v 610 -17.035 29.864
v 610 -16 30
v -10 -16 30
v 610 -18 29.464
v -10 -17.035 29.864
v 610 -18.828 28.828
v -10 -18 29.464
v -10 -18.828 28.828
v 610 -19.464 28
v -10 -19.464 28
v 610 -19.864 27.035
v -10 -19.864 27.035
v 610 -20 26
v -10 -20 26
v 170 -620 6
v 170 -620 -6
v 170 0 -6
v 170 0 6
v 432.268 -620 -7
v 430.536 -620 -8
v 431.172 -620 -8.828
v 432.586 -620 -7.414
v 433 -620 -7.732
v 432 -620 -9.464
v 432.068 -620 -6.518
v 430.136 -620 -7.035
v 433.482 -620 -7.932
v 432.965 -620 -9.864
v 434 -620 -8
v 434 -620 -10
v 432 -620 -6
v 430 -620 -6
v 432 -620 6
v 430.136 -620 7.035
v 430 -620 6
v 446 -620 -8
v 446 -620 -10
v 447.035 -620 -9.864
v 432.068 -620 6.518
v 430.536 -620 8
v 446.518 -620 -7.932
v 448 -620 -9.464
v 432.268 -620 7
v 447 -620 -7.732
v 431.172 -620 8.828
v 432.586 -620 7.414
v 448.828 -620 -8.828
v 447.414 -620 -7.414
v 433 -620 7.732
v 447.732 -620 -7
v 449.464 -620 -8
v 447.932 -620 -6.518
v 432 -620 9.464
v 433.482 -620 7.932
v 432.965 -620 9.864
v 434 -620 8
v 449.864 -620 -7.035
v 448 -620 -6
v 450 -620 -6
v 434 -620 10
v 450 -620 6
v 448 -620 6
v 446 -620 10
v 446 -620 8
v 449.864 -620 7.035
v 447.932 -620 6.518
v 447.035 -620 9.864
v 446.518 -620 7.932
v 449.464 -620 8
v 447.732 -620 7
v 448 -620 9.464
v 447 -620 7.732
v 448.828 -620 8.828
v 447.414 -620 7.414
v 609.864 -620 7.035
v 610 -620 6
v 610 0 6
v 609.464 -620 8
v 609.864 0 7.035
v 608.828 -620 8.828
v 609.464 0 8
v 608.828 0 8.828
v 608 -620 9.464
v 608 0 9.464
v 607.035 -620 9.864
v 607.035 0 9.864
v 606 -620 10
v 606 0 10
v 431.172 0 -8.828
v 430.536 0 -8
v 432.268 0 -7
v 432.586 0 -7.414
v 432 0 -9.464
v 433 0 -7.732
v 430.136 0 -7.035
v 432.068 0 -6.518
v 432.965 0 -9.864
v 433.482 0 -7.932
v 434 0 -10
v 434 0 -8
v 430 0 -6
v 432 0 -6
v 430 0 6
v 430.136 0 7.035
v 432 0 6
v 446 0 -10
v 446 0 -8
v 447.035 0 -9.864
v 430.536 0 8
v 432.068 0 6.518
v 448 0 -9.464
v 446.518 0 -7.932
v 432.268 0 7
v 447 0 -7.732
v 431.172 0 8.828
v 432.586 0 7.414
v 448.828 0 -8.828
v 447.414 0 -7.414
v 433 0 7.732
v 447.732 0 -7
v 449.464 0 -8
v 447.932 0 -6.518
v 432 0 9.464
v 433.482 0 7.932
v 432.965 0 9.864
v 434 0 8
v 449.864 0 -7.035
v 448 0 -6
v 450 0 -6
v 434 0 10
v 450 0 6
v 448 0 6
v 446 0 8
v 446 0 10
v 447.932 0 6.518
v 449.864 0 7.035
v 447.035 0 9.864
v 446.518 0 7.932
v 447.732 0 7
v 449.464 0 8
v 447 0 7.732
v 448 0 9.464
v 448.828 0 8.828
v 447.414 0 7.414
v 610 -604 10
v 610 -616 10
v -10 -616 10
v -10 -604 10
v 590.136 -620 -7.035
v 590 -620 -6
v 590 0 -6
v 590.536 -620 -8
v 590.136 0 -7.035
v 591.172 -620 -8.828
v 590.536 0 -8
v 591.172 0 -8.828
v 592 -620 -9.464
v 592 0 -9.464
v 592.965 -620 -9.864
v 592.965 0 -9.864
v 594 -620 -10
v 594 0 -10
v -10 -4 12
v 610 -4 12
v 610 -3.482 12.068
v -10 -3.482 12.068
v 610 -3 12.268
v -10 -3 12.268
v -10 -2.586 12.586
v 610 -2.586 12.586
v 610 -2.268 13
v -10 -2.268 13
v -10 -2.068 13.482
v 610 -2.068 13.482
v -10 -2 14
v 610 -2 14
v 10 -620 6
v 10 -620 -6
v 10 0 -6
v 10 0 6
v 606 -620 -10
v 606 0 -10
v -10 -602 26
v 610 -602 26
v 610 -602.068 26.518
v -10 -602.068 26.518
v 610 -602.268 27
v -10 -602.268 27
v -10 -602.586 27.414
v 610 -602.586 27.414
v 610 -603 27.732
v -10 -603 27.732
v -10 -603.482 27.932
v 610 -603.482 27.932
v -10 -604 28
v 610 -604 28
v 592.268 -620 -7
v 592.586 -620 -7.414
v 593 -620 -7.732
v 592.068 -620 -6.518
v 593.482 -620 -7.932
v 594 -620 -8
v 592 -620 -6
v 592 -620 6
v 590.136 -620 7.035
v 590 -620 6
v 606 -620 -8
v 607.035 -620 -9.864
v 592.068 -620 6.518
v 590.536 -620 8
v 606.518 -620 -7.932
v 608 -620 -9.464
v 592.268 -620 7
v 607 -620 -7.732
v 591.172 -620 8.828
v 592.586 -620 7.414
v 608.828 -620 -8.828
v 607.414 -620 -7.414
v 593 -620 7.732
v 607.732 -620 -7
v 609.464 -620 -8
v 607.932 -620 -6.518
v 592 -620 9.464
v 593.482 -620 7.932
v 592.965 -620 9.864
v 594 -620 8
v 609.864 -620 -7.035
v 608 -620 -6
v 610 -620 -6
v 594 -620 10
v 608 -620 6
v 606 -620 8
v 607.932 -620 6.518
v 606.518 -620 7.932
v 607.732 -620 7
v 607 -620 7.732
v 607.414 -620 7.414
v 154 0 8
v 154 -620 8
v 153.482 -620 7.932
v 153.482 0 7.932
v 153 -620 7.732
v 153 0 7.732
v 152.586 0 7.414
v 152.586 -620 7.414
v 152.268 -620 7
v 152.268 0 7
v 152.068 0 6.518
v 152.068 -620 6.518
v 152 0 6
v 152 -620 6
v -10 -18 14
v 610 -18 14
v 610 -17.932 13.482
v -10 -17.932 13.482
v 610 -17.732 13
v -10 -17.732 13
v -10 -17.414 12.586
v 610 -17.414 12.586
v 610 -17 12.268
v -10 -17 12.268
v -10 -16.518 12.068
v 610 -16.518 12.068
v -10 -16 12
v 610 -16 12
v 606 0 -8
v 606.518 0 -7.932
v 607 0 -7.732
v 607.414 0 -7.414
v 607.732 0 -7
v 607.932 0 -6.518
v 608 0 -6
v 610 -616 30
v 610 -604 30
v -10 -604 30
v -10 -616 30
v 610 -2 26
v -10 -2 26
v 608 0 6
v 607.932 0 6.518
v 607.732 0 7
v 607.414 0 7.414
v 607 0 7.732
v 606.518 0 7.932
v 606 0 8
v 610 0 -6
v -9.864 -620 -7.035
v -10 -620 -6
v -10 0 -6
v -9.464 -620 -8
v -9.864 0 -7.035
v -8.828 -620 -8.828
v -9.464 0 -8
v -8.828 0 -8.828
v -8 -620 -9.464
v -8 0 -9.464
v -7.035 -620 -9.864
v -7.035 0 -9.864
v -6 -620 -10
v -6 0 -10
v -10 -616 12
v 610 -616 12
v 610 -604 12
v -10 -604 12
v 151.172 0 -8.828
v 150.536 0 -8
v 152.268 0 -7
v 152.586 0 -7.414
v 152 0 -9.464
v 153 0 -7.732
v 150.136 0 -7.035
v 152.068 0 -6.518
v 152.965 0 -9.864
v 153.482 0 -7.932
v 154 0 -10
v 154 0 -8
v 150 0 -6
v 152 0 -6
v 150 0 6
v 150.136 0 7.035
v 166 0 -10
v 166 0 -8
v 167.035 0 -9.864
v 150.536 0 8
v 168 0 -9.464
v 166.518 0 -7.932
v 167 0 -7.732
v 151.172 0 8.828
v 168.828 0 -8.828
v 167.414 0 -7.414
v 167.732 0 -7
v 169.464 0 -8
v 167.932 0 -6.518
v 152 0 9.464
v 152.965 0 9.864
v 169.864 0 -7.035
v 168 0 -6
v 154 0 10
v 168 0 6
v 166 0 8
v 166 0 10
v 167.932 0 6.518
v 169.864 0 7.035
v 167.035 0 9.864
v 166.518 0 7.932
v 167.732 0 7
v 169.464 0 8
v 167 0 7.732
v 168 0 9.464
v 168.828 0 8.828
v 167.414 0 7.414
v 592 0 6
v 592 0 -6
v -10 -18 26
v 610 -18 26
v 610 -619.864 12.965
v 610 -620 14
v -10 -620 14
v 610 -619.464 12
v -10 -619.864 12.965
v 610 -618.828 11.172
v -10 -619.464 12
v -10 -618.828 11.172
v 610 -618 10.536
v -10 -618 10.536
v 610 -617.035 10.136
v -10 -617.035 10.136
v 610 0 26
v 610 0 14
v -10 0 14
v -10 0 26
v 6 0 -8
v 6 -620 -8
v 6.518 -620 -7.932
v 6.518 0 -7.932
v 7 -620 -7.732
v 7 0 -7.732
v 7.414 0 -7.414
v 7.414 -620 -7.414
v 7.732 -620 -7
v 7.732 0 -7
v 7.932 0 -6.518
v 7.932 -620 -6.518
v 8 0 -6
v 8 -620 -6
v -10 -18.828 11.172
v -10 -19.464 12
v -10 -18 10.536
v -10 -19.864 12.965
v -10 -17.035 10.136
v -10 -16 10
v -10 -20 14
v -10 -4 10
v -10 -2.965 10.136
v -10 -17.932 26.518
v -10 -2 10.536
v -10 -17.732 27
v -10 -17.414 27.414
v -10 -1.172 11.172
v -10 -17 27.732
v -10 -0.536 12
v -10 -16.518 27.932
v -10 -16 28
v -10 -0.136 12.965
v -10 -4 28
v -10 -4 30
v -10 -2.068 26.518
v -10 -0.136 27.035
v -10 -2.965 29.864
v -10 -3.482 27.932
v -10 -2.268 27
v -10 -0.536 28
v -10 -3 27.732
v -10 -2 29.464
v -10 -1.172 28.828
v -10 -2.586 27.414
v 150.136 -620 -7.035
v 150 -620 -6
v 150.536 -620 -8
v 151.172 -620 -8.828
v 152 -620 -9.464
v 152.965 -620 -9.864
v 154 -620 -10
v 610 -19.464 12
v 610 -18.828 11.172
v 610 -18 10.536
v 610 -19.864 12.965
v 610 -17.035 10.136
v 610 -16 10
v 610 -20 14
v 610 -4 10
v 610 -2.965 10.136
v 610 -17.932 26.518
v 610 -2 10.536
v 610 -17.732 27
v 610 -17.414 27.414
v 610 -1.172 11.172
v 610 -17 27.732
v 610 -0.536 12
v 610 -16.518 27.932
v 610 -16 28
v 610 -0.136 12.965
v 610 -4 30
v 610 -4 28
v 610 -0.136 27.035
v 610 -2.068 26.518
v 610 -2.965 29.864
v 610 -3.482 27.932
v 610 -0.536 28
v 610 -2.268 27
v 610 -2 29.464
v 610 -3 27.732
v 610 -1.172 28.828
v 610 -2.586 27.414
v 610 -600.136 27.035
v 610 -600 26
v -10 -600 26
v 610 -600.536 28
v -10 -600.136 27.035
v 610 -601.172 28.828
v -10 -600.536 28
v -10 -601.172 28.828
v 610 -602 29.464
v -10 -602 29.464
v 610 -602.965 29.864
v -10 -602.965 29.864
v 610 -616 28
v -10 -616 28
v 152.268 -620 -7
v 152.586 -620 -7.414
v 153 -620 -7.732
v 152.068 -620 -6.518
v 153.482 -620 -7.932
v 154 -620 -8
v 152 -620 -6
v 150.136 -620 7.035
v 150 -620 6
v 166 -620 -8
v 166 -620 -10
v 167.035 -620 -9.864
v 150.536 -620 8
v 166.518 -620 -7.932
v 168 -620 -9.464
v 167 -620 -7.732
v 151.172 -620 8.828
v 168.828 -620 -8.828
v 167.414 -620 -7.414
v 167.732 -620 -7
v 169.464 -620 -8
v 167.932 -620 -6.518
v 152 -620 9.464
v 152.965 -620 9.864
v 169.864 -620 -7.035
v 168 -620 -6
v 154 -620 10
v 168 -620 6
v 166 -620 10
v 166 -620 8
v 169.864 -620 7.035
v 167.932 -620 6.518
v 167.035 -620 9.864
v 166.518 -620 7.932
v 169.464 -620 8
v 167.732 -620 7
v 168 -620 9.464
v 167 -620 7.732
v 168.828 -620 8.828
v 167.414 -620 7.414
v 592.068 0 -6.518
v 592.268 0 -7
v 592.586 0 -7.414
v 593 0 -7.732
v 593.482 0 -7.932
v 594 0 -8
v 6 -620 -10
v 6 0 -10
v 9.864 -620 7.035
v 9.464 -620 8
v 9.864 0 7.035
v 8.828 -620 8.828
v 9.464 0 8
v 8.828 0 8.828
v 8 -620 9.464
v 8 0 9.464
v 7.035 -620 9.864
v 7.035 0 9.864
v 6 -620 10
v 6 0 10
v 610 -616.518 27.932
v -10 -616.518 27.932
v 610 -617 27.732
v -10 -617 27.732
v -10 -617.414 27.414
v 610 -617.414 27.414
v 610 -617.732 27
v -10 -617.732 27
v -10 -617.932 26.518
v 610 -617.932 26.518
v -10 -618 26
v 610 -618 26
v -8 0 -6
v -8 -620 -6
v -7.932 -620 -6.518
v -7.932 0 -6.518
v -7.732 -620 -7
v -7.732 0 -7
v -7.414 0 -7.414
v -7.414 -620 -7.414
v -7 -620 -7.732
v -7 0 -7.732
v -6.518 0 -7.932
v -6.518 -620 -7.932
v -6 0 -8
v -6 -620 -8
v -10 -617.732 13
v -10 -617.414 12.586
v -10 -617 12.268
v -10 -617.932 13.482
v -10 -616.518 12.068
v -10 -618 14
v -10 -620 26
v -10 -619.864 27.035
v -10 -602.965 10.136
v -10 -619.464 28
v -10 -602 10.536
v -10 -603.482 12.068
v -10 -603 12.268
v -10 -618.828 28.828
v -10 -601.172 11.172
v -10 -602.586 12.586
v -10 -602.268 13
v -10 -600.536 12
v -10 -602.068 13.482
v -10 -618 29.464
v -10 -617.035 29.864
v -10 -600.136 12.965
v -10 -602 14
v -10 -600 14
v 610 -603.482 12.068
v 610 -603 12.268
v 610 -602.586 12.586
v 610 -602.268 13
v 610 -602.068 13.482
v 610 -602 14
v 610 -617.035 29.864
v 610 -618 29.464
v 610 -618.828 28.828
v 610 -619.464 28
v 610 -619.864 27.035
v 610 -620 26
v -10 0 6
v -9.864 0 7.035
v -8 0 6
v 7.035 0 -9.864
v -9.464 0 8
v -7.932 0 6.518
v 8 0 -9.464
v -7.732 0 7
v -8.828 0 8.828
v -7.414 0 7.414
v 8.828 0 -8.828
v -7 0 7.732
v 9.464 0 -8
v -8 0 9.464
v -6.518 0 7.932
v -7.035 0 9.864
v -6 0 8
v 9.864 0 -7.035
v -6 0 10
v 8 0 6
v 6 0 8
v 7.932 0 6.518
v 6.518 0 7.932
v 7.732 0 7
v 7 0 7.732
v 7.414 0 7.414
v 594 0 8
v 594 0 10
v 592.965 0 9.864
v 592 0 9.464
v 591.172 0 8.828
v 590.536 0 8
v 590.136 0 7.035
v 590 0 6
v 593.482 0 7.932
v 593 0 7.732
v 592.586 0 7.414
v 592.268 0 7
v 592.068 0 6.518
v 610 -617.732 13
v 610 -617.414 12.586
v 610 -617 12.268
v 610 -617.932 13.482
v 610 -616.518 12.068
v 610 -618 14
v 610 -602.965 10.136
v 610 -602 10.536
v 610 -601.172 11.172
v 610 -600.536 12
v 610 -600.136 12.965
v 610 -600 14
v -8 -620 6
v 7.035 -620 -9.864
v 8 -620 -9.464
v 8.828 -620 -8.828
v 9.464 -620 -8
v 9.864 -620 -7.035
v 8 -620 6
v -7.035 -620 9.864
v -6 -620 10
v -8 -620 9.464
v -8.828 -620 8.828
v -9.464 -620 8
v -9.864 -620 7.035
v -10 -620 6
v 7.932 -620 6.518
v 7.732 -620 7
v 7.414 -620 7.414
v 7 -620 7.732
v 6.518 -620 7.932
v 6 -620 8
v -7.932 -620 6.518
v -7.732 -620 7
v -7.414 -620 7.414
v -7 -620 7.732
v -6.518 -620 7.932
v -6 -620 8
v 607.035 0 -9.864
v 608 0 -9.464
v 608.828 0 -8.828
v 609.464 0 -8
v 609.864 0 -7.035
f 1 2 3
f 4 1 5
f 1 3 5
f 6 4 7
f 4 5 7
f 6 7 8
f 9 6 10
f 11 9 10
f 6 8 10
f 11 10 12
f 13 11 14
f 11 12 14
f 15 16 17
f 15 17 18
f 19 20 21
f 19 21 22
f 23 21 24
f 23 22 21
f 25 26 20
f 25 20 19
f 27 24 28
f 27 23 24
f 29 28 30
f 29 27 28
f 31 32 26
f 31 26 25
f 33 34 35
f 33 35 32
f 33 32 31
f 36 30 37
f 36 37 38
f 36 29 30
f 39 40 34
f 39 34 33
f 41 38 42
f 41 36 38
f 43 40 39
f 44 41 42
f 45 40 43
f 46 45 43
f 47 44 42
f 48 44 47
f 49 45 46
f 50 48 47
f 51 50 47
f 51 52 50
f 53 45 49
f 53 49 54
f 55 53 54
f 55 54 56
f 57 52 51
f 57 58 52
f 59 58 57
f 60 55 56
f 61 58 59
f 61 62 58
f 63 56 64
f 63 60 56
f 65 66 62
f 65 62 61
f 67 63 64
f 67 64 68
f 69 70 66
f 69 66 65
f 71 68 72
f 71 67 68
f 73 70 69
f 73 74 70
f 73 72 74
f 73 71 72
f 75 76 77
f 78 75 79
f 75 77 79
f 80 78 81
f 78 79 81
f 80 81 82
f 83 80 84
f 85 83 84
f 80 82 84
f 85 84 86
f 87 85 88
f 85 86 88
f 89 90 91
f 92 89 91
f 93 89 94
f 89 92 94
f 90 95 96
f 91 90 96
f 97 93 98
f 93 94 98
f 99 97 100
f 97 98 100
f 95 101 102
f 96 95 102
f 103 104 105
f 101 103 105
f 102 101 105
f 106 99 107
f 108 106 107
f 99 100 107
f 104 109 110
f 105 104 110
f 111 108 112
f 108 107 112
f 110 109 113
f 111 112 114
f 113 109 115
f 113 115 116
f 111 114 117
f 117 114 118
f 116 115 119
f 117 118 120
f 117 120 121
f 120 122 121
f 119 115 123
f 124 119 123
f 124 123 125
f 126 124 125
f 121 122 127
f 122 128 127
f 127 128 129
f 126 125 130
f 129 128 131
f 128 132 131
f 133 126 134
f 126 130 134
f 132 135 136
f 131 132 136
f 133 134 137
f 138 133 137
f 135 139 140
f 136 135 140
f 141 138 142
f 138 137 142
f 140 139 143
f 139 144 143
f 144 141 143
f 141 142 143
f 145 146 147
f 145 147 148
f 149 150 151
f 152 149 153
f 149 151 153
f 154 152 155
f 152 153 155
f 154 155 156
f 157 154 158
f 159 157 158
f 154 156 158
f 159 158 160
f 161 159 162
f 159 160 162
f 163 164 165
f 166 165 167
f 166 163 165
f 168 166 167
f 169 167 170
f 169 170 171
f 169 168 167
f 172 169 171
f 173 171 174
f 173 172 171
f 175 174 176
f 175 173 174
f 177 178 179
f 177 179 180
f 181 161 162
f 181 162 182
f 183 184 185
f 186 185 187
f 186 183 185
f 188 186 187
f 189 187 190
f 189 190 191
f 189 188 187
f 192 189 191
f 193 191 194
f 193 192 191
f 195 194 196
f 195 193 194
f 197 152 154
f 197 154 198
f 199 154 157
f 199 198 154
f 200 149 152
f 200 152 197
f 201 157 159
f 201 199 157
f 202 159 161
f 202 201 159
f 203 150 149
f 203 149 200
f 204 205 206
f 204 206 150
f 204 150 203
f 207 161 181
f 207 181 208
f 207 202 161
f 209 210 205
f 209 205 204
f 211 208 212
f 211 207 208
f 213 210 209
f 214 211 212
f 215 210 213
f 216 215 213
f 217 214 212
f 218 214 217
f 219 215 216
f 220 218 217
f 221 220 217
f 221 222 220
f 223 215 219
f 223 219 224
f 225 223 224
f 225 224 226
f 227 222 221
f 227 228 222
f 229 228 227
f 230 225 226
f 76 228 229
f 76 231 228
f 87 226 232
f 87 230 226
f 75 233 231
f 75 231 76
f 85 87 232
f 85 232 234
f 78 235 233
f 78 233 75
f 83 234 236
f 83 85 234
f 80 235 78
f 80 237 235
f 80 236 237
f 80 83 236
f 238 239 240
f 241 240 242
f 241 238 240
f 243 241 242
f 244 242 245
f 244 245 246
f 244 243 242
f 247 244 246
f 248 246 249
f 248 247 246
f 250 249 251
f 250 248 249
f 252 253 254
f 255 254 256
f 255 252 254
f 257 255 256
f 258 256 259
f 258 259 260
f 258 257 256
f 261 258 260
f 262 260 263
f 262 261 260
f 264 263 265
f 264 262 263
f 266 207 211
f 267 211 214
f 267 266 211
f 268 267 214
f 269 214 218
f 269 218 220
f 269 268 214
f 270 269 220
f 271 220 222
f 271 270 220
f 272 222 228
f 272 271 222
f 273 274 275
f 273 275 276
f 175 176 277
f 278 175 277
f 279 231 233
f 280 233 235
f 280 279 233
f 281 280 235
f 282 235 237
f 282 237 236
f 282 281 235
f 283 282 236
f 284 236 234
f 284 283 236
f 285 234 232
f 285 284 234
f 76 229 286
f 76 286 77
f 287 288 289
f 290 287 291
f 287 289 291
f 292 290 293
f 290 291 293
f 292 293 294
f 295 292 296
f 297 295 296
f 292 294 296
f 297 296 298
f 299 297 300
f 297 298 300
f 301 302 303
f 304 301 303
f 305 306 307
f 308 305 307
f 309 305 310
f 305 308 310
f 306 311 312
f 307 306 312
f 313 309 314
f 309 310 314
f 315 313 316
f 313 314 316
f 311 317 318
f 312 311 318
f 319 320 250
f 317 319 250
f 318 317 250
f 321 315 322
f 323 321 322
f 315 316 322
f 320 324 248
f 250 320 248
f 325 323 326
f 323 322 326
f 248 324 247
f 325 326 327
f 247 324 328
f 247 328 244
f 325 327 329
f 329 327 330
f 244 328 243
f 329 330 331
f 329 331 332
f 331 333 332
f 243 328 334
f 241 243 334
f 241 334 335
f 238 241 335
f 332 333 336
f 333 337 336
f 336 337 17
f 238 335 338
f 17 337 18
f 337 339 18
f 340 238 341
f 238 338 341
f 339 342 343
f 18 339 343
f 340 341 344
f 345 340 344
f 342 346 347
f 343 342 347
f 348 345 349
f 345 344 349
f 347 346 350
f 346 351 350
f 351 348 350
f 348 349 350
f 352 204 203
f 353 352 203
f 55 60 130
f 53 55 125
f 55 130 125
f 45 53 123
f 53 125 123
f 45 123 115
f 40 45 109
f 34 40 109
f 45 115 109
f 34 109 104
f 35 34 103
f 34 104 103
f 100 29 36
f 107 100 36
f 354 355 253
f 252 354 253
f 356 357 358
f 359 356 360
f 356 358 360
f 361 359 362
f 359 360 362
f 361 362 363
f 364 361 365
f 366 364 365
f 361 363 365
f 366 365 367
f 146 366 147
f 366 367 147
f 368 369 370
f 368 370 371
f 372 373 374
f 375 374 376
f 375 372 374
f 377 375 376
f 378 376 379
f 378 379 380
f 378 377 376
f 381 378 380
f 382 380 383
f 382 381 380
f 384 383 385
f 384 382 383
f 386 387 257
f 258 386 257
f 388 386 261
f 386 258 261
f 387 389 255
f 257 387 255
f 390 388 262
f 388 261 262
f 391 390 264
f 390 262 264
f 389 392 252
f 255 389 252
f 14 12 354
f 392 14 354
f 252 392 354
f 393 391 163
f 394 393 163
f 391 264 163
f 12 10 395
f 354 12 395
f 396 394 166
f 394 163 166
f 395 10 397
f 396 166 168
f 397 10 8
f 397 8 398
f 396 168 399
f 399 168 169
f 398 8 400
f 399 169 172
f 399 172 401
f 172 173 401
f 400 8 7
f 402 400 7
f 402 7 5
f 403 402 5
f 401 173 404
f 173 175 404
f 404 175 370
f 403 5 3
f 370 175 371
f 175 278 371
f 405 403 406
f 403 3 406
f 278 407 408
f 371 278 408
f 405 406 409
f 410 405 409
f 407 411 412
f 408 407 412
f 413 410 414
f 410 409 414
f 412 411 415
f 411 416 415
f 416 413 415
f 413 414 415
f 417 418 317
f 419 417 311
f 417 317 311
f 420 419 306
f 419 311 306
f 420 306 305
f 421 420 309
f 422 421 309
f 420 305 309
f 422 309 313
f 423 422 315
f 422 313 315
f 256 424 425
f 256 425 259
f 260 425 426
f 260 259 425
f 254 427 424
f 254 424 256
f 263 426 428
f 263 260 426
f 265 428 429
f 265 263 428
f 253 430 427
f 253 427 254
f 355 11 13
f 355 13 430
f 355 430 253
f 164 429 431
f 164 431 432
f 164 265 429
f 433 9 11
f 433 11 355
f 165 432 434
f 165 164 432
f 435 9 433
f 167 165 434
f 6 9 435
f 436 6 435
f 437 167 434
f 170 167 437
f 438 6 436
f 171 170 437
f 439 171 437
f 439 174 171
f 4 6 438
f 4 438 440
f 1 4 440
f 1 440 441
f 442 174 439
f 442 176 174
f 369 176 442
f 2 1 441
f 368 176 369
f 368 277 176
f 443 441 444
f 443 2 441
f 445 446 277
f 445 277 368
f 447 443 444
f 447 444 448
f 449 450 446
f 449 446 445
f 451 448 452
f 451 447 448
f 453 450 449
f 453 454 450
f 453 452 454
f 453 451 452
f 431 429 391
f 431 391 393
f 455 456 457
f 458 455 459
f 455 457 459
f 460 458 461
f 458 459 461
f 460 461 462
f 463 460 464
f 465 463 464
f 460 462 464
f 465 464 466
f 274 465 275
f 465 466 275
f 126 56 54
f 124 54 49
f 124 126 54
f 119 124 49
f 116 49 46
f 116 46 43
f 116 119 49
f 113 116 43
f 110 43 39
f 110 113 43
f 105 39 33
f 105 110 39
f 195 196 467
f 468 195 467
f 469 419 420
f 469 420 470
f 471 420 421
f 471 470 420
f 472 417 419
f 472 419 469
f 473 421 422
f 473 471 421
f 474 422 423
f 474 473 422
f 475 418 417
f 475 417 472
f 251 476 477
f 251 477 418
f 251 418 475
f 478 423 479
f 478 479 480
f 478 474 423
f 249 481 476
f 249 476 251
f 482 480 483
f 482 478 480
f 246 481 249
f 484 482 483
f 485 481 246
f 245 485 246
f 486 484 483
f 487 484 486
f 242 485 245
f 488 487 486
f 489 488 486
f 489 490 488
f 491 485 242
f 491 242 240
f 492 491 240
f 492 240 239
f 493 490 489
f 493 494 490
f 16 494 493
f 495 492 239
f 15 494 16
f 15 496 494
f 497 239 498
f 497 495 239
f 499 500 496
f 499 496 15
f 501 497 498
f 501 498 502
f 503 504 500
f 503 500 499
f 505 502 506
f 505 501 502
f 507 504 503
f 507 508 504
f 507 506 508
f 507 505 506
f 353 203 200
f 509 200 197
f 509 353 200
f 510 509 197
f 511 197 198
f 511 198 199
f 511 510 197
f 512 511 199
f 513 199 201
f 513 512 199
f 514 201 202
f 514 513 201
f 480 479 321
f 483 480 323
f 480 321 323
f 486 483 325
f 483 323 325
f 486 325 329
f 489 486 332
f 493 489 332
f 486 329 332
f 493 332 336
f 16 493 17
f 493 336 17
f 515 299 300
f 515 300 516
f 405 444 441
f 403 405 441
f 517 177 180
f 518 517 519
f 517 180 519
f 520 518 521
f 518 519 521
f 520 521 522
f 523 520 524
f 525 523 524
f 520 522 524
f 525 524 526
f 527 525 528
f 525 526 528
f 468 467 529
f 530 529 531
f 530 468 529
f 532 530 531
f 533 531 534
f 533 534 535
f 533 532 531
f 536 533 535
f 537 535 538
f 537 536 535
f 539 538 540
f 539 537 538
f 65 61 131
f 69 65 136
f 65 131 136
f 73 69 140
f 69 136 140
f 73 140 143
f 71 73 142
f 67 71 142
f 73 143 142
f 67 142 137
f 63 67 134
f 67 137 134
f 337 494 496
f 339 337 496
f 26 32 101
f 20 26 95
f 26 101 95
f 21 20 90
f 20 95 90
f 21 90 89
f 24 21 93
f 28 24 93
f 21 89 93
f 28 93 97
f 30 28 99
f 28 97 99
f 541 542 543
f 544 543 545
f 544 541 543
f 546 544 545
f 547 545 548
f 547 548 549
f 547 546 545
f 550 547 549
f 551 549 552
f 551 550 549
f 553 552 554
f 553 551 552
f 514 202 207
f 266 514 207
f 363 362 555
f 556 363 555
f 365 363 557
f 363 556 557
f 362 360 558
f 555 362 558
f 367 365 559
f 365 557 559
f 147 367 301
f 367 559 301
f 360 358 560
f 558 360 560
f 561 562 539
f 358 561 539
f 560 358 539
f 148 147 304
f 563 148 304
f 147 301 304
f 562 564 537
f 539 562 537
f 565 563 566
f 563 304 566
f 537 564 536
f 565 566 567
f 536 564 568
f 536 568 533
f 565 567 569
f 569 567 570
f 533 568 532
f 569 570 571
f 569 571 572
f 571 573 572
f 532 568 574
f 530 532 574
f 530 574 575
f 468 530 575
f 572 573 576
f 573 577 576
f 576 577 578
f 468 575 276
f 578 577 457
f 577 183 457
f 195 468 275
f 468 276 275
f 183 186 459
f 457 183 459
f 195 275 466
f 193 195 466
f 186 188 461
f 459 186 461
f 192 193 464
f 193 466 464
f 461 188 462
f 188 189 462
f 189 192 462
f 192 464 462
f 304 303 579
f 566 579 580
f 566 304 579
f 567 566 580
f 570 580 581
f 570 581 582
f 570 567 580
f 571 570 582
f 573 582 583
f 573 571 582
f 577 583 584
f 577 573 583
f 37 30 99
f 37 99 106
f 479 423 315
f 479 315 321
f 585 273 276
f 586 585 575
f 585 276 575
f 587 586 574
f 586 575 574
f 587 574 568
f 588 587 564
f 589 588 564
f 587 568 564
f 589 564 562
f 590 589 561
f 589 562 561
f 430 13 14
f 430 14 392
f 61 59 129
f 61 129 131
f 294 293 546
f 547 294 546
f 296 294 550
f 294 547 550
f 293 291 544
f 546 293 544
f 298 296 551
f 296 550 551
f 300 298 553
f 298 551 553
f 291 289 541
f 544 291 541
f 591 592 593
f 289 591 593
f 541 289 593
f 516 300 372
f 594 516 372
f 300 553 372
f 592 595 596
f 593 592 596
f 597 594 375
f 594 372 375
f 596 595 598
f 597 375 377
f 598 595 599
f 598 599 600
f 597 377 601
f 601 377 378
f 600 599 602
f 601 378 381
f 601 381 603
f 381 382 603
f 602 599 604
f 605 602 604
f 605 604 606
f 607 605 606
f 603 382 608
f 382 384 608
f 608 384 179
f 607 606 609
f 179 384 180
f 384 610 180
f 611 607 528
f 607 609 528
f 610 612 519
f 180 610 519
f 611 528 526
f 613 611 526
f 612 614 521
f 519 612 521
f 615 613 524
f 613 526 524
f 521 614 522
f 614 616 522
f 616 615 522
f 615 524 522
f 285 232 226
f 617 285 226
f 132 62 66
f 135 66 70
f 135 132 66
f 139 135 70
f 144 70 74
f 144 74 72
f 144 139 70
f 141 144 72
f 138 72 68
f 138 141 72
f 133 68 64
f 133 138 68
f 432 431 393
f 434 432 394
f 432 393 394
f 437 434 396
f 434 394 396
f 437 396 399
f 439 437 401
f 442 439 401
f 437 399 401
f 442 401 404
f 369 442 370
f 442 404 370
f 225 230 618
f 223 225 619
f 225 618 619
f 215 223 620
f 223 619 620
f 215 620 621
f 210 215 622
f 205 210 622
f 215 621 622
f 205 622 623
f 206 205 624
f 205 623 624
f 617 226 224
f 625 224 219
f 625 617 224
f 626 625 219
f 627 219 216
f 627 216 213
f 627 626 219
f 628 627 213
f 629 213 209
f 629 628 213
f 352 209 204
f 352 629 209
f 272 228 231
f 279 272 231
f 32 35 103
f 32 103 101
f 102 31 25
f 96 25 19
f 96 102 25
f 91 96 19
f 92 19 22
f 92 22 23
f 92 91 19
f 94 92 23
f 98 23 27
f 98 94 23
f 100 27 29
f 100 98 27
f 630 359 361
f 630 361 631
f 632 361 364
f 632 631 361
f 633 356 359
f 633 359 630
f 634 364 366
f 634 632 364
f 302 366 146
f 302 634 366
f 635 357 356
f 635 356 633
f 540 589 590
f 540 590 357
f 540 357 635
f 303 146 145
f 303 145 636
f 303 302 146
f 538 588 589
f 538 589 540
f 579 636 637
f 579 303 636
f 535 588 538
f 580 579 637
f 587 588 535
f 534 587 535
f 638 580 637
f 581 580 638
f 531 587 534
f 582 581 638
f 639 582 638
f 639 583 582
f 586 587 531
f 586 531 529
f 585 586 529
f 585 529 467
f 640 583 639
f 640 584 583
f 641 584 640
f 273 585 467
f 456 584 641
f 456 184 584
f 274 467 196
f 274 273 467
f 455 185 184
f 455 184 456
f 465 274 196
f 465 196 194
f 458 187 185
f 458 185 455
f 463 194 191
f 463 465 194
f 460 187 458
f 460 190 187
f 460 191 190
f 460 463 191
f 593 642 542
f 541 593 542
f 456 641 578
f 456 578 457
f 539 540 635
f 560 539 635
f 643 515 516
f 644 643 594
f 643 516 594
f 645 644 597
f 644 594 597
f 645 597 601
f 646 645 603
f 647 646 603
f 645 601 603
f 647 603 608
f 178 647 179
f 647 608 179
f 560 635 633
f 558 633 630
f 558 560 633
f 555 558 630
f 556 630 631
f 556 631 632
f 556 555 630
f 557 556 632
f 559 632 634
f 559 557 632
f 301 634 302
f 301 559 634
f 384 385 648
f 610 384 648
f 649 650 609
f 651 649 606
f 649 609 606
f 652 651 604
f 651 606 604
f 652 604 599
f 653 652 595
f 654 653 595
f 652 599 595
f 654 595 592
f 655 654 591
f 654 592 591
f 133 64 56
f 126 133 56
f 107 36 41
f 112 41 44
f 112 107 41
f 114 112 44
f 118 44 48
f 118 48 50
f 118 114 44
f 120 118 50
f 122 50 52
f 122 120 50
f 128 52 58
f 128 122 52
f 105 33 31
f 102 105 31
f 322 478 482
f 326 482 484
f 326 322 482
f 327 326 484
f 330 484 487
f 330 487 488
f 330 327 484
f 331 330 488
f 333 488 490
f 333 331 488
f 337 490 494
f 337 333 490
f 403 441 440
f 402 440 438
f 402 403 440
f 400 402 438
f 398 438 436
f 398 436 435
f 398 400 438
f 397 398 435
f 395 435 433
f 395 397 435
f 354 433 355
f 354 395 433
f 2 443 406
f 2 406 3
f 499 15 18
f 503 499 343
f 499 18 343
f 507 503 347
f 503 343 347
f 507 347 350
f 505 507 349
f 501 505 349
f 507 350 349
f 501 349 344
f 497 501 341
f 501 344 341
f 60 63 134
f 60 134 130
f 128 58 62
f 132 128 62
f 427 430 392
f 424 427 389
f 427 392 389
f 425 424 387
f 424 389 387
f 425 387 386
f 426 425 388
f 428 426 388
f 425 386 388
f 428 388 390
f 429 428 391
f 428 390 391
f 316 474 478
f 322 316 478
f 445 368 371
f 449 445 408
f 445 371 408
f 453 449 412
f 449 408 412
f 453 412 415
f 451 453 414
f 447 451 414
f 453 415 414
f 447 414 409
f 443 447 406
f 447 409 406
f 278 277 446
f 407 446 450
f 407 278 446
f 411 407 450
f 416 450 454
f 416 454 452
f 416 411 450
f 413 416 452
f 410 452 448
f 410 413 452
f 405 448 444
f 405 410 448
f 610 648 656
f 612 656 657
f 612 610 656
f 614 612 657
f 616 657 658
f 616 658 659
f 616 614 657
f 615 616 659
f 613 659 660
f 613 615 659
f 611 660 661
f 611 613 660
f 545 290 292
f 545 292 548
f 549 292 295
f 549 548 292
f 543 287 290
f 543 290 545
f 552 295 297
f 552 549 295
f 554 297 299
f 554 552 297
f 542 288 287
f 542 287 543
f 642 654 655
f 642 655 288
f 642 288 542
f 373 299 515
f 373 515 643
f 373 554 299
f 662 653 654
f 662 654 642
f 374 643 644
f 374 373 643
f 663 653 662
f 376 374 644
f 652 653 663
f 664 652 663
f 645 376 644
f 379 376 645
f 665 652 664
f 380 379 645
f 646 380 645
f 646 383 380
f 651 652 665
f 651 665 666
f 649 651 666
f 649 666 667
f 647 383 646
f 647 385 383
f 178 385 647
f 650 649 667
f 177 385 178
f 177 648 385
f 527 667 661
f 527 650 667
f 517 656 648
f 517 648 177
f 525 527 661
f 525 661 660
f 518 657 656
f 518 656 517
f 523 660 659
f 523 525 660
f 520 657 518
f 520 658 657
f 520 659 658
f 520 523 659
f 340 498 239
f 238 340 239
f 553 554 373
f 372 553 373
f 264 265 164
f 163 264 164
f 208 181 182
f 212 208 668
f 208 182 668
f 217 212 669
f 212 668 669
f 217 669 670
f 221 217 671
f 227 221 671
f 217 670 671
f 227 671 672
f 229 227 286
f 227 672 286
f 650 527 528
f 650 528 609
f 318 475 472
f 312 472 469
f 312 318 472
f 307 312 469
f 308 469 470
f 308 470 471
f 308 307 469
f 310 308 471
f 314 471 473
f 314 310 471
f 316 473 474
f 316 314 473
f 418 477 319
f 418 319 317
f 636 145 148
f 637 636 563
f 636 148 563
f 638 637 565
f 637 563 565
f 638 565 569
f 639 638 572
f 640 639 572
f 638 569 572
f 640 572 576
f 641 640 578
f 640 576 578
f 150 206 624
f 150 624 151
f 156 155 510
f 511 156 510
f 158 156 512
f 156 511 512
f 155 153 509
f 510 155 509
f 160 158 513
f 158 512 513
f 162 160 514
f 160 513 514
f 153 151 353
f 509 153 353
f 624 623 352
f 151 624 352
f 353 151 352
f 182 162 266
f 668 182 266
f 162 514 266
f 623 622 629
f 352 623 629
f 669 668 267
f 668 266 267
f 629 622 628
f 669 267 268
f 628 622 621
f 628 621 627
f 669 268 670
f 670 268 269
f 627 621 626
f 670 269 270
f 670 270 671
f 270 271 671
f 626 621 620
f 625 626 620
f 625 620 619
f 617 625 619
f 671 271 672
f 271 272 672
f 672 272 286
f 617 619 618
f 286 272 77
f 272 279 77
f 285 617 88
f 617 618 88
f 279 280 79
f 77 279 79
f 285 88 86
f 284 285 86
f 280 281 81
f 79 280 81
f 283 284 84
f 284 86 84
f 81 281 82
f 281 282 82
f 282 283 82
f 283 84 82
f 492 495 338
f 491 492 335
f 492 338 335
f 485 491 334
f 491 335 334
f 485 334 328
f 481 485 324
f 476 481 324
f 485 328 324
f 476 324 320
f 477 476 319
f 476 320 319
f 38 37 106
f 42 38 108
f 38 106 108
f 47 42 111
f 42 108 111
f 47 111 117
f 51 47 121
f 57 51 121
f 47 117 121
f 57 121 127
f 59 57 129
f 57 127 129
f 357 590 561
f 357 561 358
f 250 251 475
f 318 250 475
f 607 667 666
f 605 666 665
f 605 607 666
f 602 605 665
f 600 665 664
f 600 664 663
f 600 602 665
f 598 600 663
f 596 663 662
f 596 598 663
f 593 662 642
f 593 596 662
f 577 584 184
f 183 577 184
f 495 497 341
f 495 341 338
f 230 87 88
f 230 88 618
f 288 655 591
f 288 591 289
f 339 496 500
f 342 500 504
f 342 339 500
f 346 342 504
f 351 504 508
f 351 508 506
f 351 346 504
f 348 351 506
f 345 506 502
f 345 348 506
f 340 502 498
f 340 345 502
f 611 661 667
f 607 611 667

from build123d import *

# Parameters (mm, degrees)
SQUARE_TUBE_20_X_20_X_2_1_DEPTH   = 620
SQUARE_TUBE_20_X_20_X_2_1_2_DEPTH = 620
SQUARE_TUBE_20_X_20_X_2_1_3_DEPTH = 620
SQUARE_TUBE_20_X_20_X_2_1_4_DEPTH = 620
SQUARE_TUBE_20_X_20_X_2_1_5_DEPTH = 620
SQUARE_TUBE_20_X_20_X_2_1_6_DEPTH = 620


with BuildPart() as part:
    # Sketch12 → Square tube 20 X 20 X 2(1) (new body)
    with BuildSketch(Plane(origin=(600, 0, 0), x_dir=(1, 0, 0), z_dir=(0, -1, 0))):
        with BuildLine():
            Line((-6, -10), (6, -10))
            ThreePointArc((6, -10), (8.828427125, -8.828427125), (10, -6))
            Line((10, -6), (10, 6))
            ThreePointArc((10, 6), (8.828427125, 8.828427125), (6, 10))
            Line((6, 10), (-6, 10))
            ThreePointArc((-6, 10), (-8.828427125, 8.828427125), (-10, 6))
            Line((-10, 6), (-10, -6))
            ThreePointArc((-10, -6), (-8.828427125, -8.828427125), (-6, -10))
        make_face()
        with BuildLine():
            Line((-6, -8), (6, -8))
            ThreePointArc((6, -8), (7.414213562, -7.414213562), (8, -6))
            Line((8, -6), (8, 6))
            ThreePointArc((8, 6), (7.414213562, 7.414213562), (6, 8))
            Line((6, 8), (-6, 8))
            ThreePointArc((-6, 8), (-7.414213562, 7.414213562), (-8, 6))
            Line((-8, 6), (-8, -6))
            ThreePointArc((-8, -6), (-7.414213562, -7.414213562), (-6, -8))
        make_face(mode=Mode.SUBTRACT)
    extrude(amount=SQUARE_TUBE_20_X_20_X_2_1_DEPTH)


with BuildPart() as body_2:
    # Sketch12 on segment 2 (carried to segment 2) → Square tube 20 X 20 X 2_1 2 (new body)
    with BuildSketch(Plane.XZ):
        with BuildLine():
            Line((-6, -10), (6, -10))
            ThreePointArc((6, -10), (8.828427125, -8.828427125), (10, -6))
            Line((10, -6), (10, 6))
            ThreePointArc((10, 6), (8.828427125, 8.828427125), (6, 10))
            Line((6, 10), (-6, 10))
            ThreePointArc((-6, 10), (-8.828427125, 8.828427125), (-10, 6))
            Line((-10, 6), (-10, -6))
            ThreePointArc((-10, -6), (-8.828427125, -8.828427125), (-6, -10))
        make_face()
        with BuildLine():
            Line((-6, -8), (6, -8))
            ThreePointArc((6, -8), (7.414213562, -7.414213562), (8, -6))
            Line((8, -6), (8, 6))
            ThreePointArc((8, 6), (7.414213562, 7.414213562), (6, 8))
            Line((6, 8), (-6, 8))
            ThreePointArc((-6, 8), (-7.414213562, 7.414213562), (-8, 6))
            Line((-8, 6), (-8, -6))
            ThreePointArc((-8, -6), (-7.414213562, -7.414213562), (-6, -8))
        make_face(mode=Mode.SUBTRACT)
    extrude(amount=SQUARE_TUBE_20_X_20_X_2_1_2_DEPTH)


with BuildPart() as body_3:
    # Sketch12 on segment 3 (carried to segment 3) → Square tube 20 X 20 X 2_1 3 (new body)
    with BuildSketch(Plane(origin=(440, 0, 0), x_dir=(1, 0, 0), z_dir=(0, -1, 0))):
        with BuildLine():
            Line((-6, -10), (6, -10))
            ThreePointArc((6, -10), (8.828427125, -8.828427125), (10, -6))
            Line((10, -6), (10, 6))
            ThreePointArc((10, 6), (8.828427125, 8.828427125), (6, 10))
            Line((6, 10), (-6, 10))
            ThreePointArc((-6, 10), (-8.828427125, 8.828427125), (-10, 6))
            Line((-10, 6), (-10, -6))
            ThreePointArc((-10, -6), (-8.828427125, -8.828427125), (-6, -10))
        make_face()
        with BuildLine():
            Line((-6, -8), (6, -8))
            ThreePointArc((6, -8), (7.414213562, -7.414213562), (8, -6))
            Line((8, -6), (8, 6))
            ThreePointArc((8, 6), (7.414213562, 7.414213562), (6, 8))
            Line((6, 8), (-6, 8))
            ThreePointArc((-6, 8), (-7.414213562, 7.414213562), (-8, 6))
            Line((-8, 6), (-8, -6))
            ThreePointArc((-8, -6), (-7.414213562, -7.414213562), (-6, -8))
        make_face(mode=Mode.SUBTRACT)
    extrude(amount=SQUARE_TUBE_20_X_20_X_2_1_3_DEPTH)


with BuildPart() as body_4:
    # Sketch12 on segment 4 (carried to segment 4) → Square tube 20 X 20 X 2_1 4 (new body)
    with BuildSketch(Plane(origin=(160, 0, 0), x_dir=(1, 0, 0), z_dir=(0, -1, 0))):
        with BuildLine():
            Line((-6, -10), (6, -10))
            ThreePointArc((6, -10), (8.828427125, -8.828427125), (10, -6))
            Line((10, -6), (10, 6))
            ThreePointArc((10, 6), (8.828427125, 8.828427125), (6, 10))
            Line((6, 10), (-6, 10))
            ThreePointArc((-6, 10), (-8.828427125, 8.828427125), (-10, 6))
            Line((-10, 6), (-10, -6))
            ThreePointArc((-10, -6), (-8.828427125, -8.828427125), (-6, -10))
        make_face()
        with BuildLine():
            Line((-6, -8), (6, -8))
            ThreePointArc((6, -8), (7.414213562, -7.414213562), (8, -6))
            Line((8, -6), (8, 6))
            ThreePointArc((8, 6), (7.414213562, 7.414213562), (6, 8))
            Line((6, 8), (-6, 8))
            ThreePointArc((-6, 8), (-7.414213562, 7.414213562), (-8, 6))
            Line((-8, 6), (-8, -6))
            ThreePointArc((-8, -6), (-7.414213562, -7.414213562), (-6, -8))
        make_face(mode=Mode.SUBTRACT)
    extrude(amount=SQUARE_TUBE_20_X_20_X_2_1_4_DEPTH)


with BuildPart() as body_5:
    # Sketch12 on segment 5 (carried to segment 5) → Square tube 20 X 20 X 2_1 5 (new body)
    with BuildSketch(Plane(origin=(-10, -610, 20), x_dir=(0, 1, 0), z_dir=(1, 0, 0))):
        with BuildLine():
            Line((-6, -10), (6, -10))
            ThreePointArc((6, -10), (8.828427125, -8.828427125), (10, -6))
            Line((10, -6), (10, 6))
            ThreePointArc((10, 6), (8.828427125, 8.828427125), (6, 10))
            Line((6, 10), (-6, 10))
            ThreePointArc((-6, 10), (-8.828427125, 8.828427125), (-10, 6))
            Line((-10, 6), (-10, -6))
            ThreePointArc((-10, -6), (-8.828427125, -8.828427125), (-6, -10))
        make_face()
        with BuildLine():
            Line((-6, -8), (6, -8))
            ThreePointArc((6, -8), (7.414213562, -7.414213562), (8, -6))
            Line((8, -6), (8, 6))
            ThreePointArc((8, 6), (7.414213562, 7.414213562), (6, 8))
            Line((6, 8), (-6, 8))
            ThreePointArc((-6, 8), (-7.414213562, 7.414213562), (-8, 6))
            Line((-8, 6), (-8, -6))
            ThreePointArc((-8, -6), (-7.414213562, -7.414213562), (-6, -8))
        make_face(mode=Mode.SUBTRACT)
    extrude(amount=SQUARE_TUBE_20_X_20_X_2_1_5_DEPTH)


with BuildPart() as body_6:
    # Sketch12 on segment 6 (carried to segment 6) → Square tube 20 X 20 X 2_1 6 (new body)
    with BuildSketch(Plane(origin=(-10, -10, 20), x_dir=(0, 1, 0), z_dir=(1, 0, 0))):
        with BuildLine():
            Line((-6, -10), (6, -10))
            ThreePointArc((6, -10), (8.828427125, -8.828427125), (10, -6))
            Line((10, -6), (10, 6))
            ThreePointArc((10, 6), (8.828427125, 8.828427125), (6, 10))
            Line((6, 10), (-6, 10))
            ThreePointArc((-6, 10), (-8.828427125, 8.828427125), (-10, 6))
            Line((-10, 6), (-10, -6))
            ThreePointArc((-10, -6), (-8.828427125, -8.828427125), (-6, -10))
        make_face()
        with BuildLine():
            Line((-6, -8), (6, -8))
            ThreePointArc((6, -8), (7.414213562, -7.414213562), (8, -6))
            Line((8, -6), (8, 6))
            ThreePointArc((8, 6), (7.414213562, 7.414213562), (6, 8))
            Line((6, 8), (-6, 8))
            ThreePointArc((-6, 8), (-7.414213562, 7.414213562), (-8, 6))
            Line((-8, 6), (-8, -6))
            ThreePointArc((-8, -6), (-7.414213562, -7.414213562), (-6, -8))
        make_face(mode=Mode.SUBTRACT)
    extrude(amount=SQUARE_TUBE_20_X_20_X_2_1_6_DEPTH)


solid = Compound([part.part, body_2.part, body_3.part, body_4.part, body_5.part, body_6.part])
